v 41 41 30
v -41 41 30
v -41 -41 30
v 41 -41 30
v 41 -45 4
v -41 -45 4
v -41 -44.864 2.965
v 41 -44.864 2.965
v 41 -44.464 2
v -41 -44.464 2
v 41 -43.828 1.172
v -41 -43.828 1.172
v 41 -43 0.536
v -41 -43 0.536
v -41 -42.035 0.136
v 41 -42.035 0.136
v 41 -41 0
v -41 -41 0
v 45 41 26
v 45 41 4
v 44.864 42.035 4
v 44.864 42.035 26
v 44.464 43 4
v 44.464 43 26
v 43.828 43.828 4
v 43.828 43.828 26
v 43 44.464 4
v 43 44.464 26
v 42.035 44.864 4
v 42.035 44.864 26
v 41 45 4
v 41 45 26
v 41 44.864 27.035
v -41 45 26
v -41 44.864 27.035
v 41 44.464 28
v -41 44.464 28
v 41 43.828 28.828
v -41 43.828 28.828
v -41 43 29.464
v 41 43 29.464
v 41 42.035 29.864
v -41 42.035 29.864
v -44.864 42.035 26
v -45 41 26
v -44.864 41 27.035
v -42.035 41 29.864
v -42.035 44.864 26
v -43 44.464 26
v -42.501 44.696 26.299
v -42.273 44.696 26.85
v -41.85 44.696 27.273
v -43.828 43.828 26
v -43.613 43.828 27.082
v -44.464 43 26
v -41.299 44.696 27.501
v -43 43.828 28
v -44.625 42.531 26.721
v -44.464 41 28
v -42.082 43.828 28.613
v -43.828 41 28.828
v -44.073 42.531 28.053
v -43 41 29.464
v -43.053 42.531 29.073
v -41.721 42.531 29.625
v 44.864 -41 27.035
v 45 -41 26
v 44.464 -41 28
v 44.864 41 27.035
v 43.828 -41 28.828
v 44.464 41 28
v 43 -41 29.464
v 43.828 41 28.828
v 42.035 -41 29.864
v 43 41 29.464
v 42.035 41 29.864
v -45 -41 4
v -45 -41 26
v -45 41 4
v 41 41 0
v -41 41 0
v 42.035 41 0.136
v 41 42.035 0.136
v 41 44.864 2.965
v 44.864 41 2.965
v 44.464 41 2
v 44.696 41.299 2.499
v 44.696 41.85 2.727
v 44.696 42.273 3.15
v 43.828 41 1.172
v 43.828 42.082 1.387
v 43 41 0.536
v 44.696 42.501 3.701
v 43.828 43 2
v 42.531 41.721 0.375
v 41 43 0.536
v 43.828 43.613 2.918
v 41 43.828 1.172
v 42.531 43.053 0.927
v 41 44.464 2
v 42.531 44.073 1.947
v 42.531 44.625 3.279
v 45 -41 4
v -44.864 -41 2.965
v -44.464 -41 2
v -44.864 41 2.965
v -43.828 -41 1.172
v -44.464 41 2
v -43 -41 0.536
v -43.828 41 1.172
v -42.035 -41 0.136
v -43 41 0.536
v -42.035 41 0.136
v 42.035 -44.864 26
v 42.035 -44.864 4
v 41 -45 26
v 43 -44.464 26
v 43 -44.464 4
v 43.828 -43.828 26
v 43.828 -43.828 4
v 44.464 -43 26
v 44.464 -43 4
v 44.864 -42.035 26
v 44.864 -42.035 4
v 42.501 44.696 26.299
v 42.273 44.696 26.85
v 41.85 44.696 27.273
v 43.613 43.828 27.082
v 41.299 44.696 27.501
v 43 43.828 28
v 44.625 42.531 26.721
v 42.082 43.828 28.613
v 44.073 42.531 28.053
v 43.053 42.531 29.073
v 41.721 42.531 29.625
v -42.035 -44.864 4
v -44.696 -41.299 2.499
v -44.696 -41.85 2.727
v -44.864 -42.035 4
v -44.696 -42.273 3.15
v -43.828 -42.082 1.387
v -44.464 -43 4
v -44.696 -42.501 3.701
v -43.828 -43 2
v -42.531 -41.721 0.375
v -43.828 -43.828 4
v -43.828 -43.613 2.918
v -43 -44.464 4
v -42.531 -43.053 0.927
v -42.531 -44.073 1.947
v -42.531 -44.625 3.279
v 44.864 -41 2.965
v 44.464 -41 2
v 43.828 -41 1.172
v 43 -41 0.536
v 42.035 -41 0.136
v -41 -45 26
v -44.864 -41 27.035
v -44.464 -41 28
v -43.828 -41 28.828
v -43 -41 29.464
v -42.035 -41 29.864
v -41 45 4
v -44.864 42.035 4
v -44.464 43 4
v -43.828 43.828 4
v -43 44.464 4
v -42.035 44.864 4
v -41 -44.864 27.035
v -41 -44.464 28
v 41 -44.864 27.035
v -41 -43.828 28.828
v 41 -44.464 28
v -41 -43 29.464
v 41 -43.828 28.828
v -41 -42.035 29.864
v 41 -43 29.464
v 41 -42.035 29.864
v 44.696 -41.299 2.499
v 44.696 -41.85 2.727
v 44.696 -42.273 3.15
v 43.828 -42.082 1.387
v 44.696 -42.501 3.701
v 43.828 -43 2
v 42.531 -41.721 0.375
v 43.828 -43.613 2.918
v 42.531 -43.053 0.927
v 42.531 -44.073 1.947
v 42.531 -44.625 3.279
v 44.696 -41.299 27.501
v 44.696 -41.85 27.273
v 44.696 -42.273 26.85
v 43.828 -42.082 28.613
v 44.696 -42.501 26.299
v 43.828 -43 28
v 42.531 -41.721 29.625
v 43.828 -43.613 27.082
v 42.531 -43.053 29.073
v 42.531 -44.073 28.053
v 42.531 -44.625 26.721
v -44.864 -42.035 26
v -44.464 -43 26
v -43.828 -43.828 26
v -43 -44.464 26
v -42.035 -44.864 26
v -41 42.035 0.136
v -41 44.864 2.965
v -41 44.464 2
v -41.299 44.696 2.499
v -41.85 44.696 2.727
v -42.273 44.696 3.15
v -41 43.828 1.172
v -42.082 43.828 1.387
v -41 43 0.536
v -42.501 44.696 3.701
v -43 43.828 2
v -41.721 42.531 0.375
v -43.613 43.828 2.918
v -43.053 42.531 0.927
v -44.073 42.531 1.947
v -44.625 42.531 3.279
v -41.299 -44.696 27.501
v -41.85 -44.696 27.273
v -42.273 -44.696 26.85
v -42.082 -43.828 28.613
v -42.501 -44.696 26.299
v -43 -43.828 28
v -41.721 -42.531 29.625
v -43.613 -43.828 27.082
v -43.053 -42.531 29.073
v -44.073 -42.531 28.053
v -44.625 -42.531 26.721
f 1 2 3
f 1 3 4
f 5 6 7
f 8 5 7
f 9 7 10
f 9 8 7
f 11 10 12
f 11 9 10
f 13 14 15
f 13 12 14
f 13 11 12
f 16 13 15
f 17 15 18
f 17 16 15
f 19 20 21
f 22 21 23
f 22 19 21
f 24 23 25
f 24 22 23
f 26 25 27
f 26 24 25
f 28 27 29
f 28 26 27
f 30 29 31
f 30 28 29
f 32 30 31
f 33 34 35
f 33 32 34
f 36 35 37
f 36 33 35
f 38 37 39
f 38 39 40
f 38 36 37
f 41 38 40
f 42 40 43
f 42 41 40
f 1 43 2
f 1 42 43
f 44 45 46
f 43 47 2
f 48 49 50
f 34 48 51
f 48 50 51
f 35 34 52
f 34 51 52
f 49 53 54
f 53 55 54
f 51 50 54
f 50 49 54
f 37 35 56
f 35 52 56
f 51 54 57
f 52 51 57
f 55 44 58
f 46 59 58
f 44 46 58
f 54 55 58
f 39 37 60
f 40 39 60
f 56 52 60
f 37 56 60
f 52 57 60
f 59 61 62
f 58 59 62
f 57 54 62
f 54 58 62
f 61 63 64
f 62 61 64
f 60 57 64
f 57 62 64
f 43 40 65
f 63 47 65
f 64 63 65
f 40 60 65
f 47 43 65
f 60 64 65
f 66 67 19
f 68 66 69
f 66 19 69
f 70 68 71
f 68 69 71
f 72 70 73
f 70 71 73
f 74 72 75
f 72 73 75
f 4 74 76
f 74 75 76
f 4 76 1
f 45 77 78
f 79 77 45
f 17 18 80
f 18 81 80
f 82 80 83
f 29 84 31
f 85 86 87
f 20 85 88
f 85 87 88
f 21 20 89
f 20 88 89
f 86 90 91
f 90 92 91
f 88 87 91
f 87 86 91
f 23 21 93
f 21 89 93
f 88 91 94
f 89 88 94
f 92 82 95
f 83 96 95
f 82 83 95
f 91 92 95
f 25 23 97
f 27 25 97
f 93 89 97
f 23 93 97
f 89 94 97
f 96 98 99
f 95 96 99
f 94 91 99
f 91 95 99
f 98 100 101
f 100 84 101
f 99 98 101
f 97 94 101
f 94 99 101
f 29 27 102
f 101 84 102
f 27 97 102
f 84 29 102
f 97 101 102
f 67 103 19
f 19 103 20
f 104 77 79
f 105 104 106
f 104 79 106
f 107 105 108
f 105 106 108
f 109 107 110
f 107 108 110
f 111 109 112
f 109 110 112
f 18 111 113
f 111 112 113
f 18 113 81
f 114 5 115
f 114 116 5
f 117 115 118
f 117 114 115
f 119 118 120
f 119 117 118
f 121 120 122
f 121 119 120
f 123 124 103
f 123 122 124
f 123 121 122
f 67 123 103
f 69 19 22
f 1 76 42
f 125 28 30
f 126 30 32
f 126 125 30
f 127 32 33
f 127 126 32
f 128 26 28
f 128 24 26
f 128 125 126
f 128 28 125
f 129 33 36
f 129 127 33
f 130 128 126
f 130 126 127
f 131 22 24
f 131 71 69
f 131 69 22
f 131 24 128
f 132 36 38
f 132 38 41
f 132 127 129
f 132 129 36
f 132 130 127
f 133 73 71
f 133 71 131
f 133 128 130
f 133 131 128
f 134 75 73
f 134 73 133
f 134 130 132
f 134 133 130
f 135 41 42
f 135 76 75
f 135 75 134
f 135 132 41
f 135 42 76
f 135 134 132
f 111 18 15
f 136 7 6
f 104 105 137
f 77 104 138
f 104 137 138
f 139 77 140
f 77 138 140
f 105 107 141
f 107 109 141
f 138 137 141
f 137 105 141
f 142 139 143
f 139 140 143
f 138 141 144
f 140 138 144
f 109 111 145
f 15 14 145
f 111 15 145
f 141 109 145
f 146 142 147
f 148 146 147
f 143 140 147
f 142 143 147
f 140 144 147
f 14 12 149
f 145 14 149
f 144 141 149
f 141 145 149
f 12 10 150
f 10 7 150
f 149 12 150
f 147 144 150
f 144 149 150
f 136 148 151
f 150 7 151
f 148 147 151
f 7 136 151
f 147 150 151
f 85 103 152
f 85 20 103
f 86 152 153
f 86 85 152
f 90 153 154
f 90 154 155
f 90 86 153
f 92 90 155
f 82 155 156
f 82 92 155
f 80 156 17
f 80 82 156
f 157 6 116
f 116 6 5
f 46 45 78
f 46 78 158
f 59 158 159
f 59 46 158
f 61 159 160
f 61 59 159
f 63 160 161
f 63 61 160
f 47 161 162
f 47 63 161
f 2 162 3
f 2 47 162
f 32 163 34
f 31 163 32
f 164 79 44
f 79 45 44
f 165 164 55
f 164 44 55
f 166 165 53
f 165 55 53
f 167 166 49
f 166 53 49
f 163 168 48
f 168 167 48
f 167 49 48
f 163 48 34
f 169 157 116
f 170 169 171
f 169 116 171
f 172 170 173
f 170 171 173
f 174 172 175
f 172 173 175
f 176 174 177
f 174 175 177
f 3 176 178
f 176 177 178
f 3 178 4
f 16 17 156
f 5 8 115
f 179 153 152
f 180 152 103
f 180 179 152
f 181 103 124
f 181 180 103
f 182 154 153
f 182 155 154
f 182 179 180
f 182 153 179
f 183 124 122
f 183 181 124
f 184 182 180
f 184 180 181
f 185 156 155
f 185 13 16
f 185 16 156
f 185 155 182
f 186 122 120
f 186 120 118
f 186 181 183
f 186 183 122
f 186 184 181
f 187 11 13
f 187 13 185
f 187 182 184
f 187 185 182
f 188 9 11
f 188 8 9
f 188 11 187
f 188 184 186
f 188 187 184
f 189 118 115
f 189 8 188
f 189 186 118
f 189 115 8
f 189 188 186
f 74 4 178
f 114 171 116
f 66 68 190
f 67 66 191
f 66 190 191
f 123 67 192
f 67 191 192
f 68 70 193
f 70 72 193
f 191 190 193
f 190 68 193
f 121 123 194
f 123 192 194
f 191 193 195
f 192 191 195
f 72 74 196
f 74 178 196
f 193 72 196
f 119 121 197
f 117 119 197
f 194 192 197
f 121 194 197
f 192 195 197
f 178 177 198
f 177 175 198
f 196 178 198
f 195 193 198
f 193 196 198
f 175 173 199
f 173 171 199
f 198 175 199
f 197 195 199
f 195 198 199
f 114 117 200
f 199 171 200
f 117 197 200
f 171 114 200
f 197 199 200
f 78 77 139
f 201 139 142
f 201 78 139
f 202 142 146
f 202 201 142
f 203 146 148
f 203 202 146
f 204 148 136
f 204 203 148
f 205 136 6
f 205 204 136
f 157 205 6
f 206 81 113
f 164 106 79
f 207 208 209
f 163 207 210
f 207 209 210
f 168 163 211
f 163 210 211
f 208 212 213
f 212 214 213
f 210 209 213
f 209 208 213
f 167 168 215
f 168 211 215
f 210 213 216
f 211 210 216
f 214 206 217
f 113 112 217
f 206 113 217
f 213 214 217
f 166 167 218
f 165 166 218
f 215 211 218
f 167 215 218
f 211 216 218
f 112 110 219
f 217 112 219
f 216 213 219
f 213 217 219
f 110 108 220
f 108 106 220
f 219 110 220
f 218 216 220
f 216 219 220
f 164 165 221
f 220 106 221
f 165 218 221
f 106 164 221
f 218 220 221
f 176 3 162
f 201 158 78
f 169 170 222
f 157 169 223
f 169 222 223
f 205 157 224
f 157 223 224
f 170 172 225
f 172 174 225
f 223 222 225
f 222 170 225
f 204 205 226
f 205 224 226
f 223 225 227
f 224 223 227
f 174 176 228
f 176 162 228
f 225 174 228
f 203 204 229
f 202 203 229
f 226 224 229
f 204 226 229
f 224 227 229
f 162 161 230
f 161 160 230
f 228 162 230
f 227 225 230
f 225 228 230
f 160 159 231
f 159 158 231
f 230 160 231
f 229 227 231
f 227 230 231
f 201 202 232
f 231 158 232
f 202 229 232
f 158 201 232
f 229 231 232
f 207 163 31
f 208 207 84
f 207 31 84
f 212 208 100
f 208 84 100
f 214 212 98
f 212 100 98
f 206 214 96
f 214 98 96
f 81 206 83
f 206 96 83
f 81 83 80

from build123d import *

# Parameters (mm, degrees)
SKETCH_1_W      = 90
SKETCH_1_H      = 90
EXTRUDE_1_DEPTH = 30
FILLET_1_R      = 4


with BuildPart() as part:
    # 草图1 → 凸台-拉伸1 (new body)
    with BuildSketch(Plane.XY):
        Rectangle(SKETCH_1_W, SKETCH_1_H)
    extrude(amount=EXTRUDE_1_DEPTH)

    # 圆角1
    fillet_1_edges = [part.edges().sort_by_distance(p)[0] for p in [
        (-45, 0, 30),
        (0, -45, 30),
        (45, 0, 30),
        (0, -45, 0),
        (-45, 0, 0),
        (0, 45, 0),
        (45, 0, 0),
        (45, -45, 15),
        (-45, -45, 15),
        (-45, 45, 15),
        (45, 45, 15),
        (0, 45, 30),
    ]]
    fillet(fillet_1_edges, radius=FILLET_1_R)


solid = part.part
